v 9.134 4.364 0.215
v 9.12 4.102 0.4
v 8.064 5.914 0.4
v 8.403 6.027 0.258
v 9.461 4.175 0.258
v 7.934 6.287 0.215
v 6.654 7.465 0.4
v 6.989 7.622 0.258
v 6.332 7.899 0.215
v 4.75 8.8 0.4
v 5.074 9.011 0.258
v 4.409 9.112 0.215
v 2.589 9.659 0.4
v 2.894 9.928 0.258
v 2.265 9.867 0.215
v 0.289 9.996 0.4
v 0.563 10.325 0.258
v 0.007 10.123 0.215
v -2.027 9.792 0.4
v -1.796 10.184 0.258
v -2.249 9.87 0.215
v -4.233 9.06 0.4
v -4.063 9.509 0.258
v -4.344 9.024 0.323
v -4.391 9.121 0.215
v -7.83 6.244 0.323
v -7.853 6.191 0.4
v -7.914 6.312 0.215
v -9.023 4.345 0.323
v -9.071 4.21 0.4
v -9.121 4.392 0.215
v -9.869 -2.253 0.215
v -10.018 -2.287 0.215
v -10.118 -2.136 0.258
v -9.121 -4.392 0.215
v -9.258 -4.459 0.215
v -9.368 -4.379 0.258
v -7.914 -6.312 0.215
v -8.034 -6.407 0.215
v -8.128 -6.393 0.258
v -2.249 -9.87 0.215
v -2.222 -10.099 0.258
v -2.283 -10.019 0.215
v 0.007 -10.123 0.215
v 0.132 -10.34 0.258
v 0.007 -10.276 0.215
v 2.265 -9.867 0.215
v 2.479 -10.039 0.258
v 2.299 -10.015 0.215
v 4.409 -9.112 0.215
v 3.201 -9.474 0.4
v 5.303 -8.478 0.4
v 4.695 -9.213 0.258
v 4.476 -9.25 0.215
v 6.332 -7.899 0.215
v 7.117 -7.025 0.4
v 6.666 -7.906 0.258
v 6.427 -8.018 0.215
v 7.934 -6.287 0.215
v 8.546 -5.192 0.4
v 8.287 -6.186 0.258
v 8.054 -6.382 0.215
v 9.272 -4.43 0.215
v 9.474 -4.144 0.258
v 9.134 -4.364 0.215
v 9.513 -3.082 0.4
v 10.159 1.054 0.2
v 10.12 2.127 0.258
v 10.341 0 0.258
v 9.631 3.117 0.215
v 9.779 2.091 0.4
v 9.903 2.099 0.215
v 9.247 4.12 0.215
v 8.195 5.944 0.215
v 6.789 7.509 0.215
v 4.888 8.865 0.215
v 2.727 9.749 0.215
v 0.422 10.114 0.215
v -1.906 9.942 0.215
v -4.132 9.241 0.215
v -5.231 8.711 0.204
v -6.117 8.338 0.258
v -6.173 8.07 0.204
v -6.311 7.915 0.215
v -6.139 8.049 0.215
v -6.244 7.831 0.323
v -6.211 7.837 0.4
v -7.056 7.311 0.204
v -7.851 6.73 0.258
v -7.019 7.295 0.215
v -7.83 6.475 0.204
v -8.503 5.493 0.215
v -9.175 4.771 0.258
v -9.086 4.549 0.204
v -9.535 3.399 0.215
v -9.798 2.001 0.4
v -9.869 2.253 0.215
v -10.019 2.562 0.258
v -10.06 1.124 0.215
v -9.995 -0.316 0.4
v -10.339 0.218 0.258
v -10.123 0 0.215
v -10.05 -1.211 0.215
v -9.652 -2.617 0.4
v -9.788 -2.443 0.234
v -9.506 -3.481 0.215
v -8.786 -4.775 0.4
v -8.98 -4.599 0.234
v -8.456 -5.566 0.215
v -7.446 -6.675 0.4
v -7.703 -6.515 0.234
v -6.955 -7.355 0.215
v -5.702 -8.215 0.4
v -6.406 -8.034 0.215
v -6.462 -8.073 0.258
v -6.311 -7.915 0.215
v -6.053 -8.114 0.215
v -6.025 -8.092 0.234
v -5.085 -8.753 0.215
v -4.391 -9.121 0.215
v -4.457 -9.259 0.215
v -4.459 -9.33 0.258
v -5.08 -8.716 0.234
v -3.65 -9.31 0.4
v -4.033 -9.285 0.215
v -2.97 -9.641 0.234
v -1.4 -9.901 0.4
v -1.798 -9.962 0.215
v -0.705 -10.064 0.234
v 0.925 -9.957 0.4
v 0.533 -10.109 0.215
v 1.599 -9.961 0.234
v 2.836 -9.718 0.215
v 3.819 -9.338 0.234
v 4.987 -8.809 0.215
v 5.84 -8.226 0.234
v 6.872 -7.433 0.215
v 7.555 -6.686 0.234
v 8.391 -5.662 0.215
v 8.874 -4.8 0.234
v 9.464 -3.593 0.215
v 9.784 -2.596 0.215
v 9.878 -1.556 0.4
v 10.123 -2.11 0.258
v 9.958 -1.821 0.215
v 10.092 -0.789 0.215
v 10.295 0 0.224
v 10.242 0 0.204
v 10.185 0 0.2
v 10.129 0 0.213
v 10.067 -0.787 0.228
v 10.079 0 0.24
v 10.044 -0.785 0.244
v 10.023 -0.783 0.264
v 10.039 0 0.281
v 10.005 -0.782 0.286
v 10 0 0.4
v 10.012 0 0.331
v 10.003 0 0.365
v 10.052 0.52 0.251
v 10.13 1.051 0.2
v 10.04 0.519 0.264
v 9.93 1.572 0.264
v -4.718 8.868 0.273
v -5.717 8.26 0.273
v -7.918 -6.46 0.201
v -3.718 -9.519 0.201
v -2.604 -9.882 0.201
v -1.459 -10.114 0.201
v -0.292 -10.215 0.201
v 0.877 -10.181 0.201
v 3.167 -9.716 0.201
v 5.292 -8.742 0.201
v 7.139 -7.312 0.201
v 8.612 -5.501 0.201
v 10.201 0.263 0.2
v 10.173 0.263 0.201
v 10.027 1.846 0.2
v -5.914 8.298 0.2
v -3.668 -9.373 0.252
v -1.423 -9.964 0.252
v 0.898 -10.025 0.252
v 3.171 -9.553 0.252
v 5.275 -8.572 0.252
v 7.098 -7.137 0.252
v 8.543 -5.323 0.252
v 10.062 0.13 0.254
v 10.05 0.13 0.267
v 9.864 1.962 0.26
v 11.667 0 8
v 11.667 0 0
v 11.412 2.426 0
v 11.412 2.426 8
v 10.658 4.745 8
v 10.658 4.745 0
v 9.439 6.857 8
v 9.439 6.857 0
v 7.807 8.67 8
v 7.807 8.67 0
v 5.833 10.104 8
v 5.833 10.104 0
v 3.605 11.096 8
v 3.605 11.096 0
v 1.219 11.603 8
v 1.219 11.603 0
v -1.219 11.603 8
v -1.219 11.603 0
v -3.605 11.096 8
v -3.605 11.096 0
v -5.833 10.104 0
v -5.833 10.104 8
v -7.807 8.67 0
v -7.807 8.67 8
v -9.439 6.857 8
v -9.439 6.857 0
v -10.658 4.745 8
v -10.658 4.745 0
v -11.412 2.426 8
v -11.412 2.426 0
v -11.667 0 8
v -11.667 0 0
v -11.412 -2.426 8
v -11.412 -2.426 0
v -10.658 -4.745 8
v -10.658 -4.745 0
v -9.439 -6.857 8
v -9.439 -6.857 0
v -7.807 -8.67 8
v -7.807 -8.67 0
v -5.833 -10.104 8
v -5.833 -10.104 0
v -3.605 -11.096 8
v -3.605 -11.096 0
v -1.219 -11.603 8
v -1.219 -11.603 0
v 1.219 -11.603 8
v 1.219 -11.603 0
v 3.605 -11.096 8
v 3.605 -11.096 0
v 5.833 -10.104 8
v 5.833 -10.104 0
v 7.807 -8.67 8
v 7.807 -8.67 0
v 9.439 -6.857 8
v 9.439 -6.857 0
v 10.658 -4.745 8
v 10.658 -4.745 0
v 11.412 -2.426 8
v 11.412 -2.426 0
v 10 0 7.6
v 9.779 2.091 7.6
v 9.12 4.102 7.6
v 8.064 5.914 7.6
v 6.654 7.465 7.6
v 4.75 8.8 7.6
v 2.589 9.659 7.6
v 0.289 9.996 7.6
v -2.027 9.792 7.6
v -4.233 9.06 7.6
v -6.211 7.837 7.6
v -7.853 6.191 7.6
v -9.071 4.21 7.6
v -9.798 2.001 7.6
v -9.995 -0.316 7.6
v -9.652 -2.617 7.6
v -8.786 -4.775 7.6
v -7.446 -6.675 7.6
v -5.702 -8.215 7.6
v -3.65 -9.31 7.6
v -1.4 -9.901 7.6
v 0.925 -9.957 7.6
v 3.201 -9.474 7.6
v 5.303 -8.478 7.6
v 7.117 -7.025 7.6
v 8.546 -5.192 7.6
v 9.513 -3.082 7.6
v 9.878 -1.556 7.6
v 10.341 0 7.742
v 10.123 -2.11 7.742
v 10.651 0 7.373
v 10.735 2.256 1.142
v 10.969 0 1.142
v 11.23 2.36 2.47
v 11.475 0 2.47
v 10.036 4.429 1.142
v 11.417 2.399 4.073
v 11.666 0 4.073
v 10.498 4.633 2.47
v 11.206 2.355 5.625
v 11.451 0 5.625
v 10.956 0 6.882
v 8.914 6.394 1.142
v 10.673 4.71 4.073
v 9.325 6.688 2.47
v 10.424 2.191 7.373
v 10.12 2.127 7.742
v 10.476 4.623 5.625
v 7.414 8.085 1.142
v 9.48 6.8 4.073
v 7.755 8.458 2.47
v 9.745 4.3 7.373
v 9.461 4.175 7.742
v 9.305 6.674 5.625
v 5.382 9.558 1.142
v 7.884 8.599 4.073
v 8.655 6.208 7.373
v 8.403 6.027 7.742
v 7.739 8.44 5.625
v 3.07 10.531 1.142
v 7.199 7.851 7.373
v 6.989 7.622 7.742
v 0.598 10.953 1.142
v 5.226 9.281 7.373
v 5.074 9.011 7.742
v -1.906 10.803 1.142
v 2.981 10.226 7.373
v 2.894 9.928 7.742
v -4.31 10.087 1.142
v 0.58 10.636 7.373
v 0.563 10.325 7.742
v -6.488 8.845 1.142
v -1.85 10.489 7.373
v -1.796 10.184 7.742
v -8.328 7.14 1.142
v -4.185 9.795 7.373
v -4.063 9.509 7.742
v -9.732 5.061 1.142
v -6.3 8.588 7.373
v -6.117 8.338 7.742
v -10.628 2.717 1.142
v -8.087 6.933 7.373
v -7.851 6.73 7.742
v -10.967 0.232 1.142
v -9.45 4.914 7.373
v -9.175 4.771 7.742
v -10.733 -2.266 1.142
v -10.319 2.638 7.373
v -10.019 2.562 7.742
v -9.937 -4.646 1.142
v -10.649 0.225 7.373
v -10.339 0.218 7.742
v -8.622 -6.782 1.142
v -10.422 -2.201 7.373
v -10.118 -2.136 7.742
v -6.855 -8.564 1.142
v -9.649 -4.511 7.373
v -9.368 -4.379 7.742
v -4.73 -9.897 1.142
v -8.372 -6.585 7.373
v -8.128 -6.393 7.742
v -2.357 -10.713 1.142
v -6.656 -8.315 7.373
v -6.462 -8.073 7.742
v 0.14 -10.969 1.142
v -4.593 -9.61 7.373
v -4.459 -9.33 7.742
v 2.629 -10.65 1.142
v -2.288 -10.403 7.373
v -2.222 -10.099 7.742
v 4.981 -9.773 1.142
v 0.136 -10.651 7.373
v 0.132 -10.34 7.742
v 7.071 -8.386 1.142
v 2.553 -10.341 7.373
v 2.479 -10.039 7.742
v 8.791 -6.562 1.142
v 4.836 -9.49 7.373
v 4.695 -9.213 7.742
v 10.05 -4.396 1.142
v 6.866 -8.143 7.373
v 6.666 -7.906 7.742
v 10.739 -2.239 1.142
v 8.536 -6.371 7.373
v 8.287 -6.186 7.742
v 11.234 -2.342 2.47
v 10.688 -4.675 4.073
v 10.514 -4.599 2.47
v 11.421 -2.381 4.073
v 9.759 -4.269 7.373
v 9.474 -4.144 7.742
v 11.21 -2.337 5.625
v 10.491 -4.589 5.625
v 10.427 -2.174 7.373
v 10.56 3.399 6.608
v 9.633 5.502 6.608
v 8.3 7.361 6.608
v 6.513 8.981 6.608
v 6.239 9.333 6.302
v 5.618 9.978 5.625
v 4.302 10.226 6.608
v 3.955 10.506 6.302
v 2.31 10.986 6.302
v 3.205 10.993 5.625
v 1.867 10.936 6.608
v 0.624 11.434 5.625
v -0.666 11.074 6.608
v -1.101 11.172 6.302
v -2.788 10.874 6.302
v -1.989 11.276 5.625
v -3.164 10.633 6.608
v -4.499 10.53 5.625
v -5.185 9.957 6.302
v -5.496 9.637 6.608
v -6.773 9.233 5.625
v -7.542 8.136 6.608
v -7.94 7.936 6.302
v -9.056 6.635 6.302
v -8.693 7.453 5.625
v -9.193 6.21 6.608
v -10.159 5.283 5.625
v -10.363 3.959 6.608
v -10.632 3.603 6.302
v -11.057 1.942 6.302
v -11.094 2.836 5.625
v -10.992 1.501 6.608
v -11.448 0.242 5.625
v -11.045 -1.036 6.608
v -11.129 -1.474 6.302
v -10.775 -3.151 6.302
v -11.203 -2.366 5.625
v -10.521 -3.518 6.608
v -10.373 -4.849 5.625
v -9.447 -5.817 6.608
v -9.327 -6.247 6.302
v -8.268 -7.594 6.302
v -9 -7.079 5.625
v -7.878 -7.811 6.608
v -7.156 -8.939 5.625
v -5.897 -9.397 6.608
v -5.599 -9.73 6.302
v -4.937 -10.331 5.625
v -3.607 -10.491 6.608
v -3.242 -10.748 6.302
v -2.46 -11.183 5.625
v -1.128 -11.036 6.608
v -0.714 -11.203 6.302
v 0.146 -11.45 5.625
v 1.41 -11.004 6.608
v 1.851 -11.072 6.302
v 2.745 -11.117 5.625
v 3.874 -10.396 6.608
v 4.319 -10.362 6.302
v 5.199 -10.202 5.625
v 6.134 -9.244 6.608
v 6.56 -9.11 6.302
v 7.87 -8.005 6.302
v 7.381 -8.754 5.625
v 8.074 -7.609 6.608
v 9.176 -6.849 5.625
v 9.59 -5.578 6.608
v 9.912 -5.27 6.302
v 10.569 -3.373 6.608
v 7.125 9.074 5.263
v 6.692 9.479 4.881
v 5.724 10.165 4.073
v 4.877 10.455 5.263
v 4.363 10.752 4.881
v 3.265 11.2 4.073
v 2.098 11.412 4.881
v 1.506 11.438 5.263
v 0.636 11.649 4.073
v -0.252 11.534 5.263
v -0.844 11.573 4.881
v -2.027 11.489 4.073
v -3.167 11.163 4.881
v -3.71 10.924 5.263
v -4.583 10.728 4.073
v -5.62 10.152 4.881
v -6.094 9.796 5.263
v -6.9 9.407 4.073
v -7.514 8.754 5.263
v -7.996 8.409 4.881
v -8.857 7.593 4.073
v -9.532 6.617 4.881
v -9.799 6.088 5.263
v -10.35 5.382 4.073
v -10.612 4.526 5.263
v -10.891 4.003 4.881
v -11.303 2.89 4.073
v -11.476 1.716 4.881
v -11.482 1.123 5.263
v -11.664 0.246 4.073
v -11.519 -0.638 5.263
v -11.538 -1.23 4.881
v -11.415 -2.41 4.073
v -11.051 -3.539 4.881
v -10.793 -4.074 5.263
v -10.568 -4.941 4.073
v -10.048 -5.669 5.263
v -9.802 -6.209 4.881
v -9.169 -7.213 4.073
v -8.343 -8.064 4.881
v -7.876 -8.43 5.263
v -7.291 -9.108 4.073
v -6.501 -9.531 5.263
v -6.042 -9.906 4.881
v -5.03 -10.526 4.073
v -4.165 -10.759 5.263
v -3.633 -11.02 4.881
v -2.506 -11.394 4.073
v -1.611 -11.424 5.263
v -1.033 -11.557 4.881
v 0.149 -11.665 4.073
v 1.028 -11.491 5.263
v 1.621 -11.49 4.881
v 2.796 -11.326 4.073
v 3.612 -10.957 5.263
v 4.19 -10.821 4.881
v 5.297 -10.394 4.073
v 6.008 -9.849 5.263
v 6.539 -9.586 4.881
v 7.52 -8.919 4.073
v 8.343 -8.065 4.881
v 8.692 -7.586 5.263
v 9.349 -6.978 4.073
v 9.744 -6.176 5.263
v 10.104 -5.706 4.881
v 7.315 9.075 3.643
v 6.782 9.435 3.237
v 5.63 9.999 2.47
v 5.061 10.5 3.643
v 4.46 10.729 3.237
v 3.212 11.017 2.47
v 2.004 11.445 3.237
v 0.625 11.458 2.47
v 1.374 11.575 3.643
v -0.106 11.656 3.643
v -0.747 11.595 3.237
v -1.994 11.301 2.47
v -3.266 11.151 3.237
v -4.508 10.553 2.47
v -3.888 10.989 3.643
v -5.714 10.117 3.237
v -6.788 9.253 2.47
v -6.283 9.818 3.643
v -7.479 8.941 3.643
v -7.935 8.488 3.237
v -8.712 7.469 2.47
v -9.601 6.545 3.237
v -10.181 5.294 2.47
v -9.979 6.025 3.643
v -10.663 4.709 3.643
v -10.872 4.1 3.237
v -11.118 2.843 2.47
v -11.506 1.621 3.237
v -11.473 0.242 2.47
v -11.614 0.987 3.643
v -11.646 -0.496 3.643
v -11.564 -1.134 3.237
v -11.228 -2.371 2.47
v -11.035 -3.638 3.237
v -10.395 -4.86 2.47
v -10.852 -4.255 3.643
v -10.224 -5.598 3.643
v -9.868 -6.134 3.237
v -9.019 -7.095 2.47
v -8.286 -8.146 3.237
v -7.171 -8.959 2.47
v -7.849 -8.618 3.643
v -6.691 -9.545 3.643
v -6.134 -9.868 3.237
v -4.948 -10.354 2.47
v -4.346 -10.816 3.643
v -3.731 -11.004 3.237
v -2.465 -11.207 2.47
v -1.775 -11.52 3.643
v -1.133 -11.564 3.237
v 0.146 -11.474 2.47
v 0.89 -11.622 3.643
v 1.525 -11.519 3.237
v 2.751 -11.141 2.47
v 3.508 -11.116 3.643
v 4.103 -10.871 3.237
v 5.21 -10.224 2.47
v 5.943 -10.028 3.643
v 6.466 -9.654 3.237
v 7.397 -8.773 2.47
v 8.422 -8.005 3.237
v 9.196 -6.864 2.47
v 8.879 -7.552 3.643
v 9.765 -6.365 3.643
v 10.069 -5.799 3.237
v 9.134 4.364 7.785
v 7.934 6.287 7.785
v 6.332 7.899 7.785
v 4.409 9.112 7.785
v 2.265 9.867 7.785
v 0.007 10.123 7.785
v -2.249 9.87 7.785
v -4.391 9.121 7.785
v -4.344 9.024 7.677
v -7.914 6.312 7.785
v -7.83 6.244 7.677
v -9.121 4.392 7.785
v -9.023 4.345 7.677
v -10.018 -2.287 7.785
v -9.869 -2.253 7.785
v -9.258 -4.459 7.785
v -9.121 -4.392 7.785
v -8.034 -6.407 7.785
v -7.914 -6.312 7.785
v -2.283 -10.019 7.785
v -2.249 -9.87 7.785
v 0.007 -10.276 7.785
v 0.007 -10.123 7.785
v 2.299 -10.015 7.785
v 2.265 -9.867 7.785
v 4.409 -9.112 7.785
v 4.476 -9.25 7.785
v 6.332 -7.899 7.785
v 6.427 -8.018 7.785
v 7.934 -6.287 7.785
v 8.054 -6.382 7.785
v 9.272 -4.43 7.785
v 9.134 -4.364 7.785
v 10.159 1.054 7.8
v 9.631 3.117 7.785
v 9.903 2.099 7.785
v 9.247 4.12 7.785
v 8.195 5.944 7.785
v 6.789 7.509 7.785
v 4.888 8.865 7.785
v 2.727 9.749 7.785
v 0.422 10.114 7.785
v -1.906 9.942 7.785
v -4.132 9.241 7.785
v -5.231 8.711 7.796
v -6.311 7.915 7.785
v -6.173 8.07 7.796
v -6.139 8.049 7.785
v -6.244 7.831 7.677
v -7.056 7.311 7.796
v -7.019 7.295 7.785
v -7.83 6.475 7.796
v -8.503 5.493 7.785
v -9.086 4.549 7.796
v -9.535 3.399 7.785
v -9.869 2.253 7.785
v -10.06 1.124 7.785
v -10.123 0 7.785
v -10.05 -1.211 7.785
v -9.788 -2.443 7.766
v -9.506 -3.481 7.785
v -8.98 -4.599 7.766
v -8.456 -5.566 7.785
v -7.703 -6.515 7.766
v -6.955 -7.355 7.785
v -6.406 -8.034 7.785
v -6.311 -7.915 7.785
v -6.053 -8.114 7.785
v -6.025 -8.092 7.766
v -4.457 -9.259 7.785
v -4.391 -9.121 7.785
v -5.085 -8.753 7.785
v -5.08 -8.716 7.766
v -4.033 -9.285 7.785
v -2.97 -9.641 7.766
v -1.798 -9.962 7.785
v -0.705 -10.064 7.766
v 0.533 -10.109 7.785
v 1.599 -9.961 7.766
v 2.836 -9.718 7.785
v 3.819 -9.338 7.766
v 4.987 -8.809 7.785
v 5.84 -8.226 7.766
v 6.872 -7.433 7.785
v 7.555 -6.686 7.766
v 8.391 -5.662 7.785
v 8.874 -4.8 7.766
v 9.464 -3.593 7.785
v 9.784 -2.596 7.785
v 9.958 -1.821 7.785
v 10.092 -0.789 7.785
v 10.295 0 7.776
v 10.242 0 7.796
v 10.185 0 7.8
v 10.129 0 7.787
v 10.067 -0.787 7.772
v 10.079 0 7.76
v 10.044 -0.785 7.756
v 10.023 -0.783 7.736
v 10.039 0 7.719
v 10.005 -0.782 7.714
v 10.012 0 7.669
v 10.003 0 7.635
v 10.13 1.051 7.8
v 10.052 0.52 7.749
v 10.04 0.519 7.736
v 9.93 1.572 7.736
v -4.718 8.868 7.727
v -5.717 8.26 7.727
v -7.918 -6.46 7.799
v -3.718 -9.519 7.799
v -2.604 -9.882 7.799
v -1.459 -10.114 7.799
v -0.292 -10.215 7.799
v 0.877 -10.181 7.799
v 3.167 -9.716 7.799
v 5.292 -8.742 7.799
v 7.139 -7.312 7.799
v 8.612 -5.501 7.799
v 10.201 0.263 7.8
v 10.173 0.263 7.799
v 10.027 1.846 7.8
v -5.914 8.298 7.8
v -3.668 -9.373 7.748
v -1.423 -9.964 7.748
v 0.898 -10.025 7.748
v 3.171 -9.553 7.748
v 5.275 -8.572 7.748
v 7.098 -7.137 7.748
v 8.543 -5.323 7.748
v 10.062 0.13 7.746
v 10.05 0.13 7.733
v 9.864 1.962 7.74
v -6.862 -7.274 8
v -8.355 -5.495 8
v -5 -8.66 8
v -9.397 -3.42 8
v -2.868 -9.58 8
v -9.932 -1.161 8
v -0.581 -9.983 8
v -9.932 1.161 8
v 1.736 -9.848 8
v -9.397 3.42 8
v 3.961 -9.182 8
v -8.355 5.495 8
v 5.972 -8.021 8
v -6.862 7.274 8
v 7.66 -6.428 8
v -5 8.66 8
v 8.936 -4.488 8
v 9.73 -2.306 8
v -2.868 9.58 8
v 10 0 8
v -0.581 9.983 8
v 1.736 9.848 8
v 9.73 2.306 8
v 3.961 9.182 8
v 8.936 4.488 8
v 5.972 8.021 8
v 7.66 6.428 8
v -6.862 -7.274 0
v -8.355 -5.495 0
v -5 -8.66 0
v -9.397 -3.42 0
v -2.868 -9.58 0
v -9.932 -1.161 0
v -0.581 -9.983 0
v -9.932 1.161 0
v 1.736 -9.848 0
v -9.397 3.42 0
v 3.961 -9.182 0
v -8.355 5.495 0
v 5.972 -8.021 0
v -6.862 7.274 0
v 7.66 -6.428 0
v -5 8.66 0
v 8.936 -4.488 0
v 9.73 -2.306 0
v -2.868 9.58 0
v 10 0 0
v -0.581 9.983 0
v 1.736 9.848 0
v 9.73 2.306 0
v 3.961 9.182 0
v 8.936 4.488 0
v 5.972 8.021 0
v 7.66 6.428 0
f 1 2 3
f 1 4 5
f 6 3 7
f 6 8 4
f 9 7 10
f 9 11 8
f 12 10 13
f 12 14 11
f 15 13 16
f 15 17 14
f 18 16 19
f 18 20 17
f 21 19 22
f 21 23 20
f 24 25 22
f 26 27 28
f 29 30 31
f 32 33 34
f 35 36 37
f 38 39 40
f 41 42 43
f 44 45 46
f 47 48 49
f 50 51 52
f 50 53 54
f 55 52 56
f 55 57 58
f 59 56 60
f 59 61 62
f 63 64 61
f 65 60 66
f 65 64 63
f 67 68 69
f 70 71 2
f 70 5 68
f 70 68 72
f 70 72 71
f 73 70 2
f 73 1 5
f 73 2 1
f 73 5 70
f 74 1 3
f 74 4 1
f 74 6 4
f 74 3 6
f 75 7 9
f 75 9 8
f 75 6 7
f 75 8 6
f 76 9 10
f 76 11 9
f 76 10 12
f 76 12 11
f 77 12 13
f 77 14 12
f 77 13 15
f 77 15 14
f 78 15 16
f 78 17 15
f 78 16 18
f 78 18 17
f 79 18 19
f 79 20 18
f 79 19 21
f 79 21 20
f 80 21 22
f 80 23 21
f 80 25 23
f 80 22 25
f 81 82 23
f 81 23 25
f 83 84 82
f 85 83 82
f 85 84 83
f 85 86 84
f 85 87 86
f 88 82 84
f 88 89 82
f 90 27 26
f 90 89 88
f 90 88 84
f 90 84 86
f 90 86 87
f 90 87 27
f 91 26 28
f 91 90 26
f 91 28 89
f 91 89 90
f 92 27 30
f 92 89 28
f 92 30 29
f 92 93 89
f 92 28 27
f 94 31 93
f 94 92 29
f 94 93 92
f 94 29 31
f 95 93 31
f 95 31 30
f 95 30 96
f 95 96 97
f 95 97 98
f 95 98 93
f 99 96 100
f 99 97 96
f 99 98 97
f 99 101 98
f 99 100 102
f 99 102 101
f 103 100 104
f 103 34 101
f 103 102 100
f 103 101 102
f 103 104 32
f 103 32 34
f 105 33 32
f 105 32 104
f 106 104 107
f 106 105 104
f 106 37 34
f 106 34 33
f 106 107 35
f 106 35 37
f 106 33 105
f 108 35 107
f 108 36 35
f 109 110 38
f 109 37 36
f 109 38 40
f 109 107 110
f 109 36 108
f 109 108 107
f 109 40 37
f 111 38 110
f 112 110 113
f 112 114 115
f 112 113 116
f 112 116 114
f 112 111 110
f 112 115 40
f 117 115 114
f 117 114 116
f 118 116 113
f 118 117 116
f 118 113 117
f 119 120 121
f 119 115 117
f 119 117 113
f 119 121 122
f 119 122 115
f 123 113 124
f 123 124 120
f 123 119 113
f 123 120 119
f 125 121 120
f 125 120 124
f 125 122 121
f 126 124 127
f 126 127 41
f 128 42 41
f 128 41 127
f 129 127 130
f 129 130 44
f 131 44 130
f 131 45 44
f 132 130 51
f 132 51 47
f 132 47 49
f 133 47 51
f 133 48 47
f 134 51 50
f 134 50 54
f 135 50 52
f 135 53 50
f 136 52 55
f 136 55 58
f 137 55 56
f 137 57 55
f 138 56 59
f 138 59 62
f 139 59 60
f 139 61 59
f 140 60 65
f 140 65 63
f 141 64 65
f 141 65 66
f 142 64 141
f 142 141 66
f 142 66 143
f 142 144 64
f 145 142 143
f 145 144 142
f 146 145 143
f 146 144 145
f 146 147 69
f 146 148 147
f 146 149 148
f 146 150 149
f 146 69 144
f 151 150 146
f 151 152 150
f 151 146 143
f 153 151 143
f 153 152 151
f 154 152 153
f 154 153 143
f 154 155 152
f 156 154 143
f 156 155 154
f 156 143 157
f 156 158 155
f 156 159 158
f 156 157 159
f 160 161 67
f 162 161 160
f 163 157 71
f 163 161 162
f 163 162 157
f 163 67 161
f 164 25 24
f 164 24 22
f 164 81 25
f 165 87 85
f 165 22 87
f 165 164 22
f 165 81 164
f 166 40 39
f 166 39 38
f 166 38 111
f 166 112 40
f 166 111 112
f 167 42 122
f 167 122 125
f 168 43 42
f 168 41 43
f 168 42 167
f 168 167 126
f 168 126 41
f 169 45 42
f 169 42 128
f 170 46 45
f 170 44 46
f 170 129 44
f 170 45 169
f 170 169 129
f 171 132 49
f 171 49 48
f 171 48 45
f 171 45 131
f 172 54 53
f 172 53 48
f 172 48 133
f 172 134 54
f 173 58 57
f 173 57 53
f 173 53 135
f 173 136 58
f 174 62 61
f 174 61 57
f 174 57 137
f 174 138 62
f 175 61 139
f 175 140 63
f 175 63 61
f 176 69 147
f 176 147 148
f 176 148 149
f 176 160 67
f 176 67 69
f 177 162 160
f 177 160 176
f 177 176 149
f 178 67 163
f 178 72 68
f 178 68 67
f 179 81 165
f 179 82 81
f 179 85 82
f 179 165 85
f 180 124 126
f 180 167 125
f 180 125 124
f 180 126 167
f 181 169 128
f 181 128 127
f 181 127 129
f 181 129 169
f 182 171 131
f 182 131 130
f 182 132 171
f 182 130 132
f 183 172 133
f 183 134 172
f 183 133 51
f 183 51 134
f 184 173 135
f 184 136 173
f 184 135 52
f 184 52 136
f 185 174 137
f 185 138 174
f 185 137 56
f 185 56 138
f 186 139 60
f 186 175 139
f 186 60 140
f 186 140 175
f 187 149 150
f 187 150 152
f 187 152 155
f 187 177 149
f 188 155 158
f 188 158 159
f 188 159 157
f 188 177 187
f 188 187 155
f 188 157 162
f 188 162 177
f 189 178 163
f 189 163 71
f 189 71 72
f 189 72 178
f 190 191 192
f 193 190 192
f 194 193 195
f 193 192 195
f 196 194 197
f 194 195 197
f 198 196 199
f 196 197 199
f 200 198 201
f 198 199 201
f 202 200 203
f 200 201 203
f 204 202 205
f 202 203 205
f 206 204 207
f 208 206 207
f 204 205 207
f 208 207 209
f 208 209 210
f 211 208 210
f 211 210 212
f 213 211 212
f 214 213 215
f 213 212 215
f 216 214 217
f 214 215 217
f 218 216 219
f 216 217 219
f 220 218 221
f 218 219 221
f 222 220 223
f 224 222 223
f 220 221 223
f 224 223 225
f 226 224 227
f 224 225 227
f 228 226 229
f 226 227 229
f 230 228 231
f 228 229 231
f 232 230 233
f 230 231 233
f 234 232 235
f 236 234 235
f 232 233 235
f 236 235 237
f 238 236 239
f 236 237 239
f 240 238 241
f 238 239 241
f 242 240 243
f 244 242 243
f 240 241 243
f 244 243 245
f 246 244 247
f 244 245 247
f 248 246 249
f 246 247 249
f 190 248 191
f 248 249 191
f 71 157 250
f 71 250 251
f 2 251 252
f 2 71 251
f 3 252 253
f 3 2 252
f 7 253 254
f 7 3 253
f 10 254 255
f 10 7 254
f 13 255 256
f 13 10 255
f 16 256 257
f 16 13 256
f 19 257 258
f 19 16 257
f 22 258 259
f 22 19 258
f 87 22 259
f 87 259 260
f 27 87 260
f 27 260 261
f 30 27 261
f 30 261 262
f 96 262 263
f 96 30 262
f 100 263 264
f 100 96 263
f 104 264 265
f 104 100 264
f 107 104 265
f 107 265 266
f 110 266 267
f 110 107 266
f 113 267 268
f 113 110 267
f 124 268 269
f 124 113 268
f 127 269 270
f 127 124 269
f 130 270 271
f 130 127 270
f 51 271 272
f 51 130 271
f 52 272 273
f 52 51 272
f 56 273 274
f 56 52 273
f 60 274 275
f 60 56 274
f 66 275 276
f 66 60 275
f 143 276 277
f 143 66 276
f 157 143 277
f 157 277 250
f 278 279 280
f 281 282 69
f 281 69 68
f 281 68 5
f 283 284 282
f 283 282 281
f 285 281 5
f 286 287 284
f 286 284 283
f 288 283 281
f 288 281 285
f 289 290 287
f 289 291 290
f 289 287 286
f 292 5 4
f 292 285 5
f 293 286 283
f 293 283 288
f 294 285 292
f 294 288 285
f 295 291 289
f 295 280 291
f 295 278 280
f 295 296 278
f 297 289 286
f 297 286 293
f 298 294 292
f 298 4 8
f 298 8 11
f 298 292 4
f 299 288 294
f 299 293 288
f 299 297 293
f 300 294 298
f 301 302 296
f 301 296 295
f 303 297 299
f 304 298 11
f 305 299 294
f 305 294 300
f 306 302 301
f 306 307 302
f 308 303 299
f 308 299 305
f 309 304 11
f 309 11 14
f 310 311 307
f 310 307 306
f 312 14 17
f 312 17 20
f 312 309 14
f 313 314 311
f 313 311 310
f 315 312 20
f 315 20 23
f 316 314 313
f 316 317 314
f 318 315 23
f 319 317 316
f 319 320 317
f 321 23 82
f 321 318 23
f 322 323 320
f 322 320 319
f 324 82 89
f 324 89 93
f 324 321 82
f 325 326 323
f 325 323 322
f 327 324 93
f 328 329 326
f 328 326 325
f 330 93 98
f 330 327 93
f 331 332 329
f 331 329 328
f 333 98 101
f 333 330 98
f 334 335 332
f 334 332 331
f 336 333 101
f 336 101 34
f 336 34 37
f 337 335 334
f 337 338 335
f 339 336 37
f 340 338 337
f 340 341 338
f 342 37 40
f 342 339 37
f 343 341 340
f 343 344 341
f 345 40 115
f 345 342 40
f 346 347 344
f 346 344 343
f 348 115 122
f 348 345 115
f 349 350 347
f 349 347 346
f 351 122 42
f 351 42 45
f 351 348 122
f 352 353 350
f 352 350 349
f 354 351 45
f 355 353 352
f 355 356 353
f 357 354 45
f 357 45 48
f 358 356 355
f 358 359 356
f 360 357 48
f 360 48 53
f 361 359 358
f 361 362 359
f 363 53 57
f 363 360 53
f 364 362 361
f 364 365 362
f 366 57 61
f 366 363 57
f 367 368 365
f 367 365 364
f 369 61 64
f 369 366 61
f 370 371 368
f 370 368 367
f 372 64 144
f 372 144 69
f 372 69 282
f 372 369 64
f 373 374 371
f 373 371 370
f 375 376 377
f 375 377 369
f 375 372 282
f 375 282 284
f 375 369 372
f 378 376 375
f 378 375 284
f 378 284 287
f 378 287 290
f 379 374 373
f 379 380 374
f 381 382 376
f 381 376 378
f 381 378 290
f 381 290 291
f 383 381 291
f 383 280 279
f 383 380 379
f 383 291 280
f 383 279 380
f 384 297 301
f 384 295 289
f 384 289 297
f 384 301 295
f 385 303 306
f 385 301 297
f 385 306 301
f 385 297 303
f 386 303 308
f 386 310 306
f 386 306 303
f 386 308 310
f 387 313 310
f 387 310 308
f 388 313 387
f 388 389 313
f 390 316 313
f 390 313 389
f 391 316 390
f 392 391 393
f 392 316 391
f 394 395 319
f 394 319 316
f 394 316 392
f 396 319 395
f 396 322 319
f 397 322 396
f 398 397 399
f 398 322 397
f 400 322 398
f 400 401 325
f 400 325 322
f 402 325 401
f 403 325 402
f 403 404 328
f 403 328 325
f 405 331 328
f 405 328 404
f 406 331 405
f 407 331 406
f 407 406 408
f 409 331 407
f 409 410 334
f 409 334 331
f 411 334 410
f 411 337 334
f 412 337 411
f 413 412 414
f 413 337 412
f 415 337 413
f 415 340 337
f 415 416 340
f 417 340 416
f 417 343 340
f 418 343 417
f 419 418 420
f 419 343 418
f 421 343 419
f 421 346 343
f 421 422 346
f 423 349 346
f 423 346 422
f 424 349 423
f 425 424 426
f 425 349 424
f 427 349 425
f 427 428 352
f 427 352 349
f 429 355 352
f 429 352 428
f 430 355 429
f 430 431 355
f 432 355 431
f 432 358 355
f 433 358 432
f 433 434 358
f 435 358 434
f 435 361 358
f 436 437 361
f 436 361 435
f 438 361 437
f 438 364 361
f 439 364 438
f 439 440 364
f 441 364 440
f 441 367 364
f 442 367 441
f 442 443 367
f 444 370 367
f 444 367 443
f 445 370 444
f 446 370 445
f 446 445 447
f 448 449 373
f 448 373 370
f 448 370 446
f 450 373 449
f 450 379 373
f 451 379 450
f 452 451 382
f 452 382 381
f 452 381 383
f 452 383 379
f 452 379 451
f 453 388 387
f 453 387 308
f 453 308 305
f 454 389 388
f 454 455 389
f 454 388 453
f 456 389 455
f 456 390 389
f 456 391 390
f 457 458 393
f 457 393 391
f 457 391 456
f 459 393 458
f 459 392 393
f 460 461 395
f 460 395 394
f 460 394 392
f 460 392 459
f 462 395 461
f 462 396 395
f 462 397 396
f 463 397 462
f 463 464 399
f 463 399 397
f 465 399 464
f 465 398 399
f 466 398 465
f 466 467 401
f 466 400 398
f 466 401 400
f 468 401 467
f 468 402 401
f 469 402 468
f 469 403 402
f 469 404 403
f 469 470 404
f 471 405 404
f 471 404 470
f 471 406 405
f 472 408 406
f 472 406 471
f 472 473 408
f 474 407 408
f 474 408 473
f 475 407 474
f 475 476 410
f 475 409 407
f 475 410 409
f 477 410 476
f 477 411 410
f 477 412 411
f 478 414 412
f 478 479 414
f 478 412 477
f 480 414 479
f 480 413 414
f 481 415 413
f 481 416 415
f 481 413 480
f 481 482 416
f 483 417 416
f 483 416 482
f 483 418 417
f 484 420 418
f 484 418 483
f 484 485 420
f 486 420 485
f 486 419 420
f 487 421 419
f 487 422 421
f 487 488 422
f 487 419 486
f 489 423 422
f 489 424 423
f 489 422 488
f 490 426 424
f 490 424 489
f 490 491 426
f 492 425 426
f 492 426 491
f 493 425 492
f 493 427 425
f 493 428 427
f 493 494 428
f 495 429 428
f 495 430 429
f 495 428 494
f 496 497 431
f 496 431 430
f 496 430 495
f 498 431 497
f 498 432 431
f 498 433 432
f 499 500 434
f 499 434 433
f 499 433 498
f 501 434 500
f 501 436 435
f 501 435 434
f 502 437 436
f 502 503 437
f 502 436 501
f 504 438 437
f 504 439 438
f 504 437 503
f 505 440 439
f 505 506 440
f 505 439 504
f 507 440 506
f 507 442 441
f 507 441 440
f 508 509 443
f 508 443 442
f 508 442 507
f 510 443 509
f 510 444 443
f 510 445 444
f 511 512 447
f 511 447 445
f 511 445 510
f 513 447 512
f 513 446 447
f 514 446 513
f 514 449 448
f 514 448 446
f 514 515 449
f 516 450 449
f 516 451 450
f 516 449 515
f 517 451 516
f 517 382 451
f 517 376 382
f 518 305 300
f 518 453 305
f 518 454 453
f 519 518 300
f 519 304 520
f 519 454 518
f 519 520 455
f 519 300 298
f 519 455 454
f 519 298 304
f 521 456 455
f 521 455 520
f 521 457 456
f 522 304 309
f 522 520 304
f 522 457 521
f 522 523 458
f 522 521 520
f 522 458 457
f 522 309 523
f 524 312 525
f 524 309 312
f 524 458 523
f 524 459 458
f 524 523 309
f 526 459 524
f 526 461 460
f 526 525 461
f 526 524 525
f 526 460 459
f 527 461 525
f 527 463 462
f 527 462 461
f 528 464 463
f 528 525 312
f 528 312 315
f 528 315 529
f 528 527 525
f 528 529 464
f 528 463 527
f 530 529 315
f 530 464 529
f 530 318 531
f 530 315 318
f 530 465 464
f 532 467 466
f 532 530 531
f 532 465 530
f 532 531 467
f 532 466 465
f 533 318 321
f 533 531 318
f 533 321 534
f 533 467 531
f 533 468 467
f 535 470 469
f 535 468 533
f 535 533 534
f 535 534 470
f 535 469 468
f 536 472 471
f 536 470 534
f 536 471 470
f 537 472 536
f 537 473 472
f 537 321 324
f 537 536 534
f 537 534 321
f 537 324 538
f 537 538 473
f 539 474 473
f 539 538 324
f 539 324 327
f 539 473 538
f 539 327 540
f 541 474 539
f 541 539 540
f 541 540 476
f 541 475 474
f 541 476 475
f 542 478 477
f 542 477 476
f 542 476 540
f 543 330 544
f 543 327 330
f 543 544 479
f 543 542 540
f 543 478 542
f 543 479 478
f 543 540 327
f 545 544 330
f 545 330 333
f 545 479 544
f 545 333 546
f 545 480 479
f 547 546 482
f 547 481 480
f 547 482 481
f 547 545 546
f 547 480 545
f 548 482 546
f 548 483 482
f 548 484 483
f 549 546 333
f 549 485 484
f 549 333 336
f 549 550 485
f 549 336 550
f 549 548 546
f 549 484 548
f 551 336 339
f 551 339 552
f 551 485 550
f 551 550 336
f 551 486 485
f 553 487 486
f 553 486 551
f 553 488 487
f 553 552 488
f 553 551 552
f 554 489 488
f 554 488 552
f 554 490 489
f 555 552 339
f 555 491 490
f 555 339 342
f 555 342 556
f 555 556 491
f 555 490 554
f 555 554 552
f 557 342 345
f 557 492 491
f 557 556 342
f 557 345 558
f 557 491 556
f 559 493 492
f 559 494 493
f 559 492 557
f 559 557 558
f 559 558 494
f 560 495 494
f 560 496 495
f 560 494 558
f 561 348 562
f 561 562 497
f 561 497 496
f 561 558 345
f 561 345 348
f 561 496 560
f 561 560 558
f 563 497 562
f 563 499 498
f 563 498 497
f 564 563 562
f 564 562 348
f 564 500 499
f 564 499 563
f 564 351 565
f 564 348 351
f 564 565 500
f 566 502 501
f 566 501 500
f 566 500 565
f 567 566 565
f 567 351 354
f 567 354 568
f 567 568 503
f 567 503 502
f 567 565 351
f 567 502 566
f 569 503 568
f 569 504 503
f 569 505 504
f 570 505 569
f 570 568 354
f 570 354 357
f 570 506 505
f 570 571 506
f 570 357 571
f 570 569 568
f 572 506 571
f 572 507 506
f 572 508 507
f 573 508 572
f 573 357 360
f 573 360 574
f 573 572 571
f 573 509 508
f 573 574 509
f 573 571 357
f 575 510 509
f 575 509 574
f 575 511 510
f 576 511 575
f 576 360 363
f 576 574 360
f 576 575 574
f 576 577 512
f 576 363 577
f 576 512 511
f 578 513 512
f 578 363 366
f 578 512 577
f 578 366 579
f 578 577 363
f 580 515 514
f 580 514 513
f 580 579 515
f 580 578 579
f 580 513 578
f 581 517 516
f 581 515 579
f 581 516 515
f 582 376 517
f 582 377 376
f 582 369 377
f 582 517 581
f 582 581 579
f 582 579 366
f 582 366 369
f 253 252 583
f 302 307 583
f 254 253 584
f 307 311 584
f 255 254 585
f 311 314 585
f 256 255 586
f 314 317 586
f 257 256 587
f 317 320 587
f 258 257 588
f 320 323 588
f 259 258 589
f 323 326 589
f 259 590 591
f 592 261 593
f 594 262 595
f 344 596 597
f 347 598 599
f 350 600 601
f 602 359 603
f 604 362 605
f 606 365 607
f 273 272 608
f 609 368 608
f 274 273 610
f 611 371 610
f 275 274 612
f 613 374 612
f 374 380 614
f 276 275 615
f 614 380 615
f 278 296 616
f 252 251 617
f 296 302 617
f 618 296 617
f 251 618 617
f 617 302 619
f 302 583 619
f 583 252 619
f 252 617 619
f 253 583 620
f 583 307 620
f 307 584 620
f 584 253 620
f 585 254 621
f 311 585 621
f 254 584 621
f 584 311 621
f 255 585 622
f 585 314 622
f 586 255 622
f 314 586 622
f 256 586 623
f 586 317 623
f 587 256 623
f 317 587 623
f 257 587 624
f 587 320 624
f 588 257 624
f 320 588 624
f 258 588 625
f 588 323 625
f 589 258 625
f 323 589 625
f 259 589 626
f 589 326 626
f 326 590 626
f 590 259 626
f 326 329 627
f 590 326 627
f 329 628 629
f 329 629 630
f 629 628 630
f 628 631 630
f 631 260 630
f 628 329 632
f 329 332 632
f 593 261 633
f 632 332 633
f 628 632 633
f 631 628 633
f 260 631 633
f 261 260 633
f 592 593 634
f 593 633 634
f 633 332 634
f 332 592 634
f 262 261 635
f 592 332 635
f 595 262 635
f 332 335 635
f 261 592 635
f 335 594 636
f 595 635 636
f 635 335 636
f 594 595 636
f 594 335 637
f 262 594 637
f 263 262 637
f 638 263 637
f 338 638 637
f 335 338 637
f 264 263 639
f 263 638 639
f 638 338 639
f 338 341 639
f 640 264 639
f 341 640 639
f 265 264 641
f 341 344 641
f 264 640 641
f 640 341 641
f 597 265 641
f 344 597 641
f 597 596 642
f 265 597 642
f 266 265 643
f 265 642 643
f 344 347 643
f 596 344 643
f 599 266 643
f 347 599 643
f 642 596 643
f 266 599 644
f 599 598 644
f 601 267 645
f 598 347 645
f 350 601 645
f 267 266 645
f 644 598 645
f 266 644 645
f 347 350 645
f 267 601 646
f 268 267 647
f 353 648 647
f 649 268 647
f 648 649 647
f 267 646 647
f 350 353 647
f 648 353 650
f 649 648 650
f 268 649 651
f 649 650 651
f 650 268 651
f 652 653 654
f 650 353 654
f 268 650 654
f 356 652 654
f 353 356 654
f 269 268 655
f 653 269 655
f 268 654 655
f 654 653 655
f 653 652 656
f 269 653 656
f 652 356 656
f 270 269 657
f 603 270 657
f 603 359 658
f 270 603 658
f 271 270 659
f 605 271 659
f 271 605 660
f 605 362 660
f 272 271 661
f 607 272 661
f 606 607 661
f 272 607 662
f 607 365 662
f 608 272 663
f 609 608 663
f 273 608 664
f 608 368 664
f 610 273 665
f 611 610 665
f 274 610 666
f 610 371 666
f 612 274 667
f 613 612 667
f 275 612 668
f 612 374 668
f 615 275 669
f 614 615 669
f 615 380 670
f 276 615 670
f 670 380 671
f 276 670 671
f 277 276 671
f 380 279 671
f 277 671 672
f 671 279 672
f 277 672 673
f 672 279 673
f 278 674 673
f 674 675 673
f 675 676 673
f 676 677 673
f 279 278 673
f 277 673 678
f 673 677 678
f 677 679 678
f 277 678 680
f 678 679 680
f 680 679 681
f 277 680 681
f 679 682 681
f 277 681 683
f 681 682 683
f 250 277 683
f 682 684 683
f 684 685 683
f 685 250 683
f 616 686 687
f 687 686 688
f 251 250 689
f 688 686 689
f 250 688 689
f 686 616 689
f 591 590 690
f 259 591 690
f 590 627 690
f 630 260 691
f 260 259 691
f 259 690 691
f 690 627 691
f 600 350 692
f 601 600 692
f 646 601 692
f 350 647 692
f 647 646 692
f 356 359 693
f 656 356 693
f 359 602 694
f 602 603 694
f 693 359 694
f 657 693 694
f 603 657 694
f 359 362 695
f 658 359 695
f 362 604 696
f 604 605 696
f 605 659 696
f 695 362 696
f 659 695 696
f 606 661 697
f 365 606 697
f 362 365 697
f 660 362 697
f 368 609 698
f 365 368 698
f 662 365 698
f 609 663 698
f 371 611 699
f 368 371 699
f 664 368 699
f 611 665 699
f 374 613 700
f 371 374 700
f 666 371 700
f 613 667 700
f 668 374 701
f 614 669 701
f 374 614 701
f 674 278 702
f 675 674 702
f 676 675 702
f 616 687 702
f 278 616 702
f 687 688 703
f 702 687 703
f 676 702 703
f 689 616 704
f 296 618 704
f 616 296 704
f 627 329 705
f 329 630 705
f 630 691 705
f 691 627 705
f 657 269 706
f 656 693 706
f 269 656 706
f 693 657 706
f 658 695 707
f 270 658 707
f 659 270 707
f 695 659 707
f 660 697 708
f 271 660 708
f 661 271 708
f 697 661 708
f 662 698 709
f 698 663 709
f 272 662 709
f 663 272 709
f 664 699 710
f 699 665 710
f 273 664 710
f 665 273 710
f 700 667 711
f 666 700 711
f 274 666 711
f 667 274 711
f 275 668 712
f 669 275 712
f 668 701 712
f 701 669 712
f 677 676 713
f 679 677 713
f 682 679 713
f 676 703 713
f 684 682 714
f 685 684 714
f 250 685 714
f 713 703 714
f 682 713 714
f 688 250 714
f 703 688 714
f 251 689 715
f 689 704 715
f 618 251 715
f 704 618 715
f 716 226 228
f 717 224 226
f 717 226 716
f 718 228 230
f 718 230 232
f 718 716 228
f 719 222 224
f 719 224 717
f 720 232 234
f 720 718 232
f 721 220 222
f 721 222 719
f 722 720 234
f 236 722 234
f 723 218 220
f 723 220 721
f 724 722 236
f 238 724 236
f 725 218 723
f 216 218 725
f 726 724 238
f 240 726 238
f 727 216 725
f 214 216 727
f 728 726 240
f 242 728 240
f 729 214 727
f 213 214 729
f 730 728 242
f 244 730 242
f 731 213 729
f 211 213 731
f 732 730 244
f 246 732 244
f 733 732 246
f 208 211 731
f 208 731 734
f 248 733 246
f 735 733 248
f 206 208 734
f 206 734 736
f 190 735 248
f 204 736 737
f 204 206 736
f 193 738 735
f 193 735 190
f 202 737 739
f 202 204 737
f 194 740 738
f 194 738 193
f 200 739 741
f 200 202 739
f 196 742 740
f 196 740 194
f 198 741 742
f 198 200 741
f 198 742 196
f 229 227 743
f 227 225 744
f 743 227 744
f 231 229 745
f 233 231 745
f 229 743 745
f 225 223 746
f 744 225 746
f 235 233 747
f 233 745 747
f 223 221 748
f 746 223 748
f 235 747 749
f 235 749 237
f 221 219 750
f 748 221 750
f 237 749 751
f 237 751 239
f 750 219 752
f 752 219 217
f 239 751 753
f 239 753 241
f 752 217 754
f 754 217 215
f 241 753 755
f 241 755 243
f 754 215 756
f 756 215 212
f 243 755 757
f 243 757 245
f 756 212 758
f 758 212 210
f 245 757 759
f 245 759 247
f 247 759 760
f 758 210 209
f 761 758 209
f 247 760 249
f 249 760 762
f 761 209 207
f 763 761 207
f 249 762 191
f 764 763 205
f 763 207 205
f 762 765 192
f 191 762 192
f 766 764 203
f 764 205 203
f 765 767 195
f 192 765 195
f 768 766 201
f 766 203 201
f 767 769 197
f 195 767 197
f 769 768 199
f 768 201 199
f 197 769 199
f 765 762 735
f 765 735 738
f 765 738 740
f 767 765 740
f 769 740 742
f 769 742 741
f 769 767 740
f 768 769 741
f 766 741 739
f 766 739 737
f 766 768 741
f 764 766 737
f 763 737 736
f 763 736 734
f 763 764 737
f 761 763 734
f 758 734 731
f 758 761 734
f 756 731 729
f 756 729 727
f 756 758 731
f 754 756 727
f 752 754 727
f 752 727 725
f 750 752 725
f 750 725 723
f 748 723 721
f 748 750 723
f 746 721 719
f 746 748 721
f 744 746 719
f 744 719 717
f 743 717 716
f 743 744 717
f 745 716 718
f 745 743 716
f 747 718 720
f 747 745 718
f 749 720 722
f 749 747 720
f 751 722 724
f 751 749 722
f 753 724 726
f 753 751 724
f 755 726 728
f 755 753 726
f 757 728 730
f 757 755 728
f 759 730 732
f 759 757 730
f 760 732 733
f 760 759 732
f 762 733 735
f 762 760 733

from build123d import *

# Parameters (mm, degrees)
F0_R     = 11.6666666667
F0_R_2   = 10
F1_DEPTH = 8
F4_R     = 0.2


with BuildPart() as f1:
    # F0 (on Top) → F1 (new body)
    with BuildSketch(Plane.XY):
        Circle(F0_R)
        Circle(F0_R_2, mode=Mode.SUBTRACT)
    extrude(amount=F1_DEPTH)


with BuildPart() as f3:
    # F2 (on Front) → F3 (revolve)
    with BuildSketch(Plane.XZ):
        with BuildLine():
            add(Edge.make_bspline(
                [(10, 8), (10.6480475515, 7.6817194931), (11.6666666667, 6.0383775271), (11.6666666667, 4)],
                knots=[0, 0, 0, 0, 4.3333333333, 4.3333333333, 4.3333333333, 4.3333333333], degree=3))
            Line((10, 8), (10, 0))
            add(Edge.make_bspline(
                [(10, 0), (10.6480475515, 0.3182805069), (11.6666666667, 1.9616224729), (11.6666666667, 4)],
                knots=[0, 0, 0, 0, 4.3333333333, 4.3333333333, 4.3333333333, 4.3333333333], degree=3))
        make_face()
    revolve(axis=Axis((0, 0, 4), (0, 0, 1)))

    # F4
    f4_edges = [f3.edges().sort_by_distance(p)[0] for p in [
        (-10, 0, 0),
        (-10, 0, 8),
    ]]
    fillet(f4_edges, radius=F4_R)


solid = Compound([f1.part, f3.part])
